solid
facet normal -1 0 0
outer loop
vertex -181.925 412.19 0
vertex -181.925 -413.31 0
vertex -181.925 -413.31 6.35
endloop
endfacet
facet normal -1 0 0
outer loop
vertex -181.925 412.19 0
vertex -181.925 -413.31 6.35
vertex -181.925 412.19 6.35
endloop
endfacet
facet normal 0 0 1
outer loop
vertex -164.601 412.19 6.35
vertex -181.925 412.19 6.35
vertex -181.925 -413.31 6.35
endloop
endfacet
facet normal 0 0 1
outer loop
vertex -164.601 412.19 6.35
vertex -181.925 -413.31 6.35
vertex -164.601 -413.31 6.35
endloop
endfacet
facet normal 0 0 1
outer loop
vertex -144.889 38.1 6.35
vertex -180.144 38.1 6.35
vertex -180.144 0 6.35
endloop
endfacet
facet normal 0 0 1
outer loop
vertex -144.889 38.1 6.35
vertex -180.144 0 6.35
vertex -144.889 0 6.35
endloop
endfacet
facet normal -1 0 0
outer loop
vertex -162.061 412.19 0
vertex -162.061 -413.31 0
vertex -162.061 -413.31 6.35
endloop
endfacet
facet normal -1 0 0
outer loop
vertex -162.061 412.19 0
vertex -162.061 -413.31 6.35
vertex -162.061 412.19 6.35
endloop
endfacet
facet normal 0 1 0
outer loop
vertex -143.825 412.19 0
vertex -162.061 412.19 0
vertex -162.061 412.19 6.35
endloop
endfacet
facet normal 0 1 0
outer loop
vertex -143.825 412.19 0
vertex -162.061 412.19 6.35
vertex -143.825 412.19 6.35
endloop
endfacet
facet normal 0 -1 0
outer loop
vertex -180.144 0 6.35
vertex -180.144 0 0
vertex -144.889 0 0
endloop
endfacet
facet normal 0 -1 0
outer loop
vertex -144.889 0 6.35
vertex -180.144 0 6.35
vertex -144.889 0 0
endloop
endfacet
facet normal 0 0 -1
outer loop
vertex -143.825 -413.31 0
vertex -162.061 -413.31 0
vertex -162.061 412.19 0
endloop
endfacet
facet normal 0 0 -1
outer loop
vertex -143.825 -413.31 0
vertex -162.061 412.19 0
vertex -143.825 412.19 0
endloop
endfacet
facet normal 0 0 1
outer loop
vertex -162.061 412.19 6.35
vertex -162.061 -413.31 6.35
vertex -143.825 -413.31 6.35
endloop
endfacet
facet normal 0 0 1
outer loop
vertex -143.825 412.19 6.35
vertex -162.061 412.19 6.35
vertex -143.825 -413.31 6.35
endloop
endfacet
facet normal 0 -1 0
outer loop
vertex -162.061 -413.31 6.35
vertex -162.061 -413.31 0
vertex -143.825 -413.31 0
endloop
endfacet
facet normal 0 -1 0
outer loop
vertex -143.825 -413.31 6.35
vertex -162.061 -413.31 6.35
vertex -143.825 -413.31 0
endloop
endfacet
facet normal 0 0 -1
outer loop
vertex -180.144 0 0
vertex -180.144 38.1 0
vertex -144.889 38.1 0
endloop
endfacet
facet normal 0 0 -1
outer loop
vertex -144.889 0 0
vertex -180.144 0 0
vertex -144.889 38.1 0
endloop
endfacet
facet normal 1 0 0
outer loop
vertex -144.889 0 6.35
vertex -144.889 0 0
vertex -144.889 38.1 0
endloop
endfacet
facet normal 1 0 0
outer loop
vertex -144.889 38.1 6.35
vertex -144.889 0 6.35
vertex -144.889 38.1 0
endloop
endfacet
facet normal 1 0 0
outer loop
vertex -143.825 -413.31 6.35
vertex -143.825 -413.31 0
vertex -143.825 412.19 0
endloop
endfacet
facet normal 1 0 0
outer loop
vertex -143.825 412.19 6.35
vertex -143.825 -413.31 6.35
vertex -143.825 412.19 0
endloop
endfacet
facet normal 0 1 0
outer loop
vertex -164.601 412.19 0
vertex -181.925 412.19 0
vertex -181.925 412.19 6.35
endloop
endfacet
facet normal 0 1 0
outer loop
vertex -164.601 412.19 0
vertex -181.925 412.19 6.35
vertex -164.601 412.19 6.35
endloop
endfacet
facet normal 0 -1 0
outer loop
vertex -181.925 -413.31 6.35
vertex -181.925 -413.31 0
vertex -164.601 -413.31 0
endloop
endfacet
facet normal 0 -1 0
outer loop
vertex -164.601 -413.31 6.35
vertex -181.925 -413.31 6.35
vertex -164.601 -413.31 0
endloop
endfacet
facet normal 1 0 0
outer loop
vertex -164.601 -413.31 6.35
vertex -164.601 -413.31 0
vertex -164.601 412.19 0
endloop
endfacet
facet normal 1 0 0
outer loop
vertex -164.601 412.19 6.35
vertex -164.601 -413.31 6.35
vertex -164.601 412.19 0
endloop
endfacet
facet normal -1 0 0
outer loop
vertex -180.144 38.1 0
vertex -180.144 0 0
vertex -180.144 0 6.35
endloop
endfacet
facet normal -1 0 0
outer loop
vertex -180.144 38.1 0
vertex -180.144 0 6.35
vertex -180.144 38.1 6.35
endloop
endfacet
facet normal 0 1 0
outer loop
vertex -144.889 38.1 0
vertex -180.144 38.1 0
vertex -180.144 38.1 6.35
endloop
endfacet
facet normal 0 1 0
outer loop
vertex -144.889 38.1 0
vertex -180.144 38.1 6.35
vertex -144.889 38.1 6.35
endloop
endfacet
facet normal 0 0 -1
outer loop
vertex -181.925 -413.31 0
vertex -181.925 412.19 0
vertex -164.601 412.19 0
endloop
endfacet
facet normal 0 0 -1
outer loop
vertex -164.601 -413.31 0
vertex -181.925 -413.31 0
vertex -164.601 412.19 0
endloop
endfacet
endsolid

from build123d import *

# Parameters (mm, degrees)
F0_W     = 38.1
F0_H     = 825.5
F2_DEPTH = 6.35
F1_W     = 2.54
F1_H     = 990.6
F3_DEPTH = 284.48
F4_W     = 35.2549552917
F4_H     = 38.1
F5_DEPTH = 6.35


# Not quite as in the source:
# - a feature of the source that left no trace in its solid (it failed there, or was rolled back) is left out


with BuildPart() as f2:
    # F0 (on Top) → F2 (new body)
    with BuildSketch(Plane.XY):
        with Locations((-162.8751962613, -0.5595125258)):
            Rectangle(F0_W, F0_H)
    extrude(amount=F2_DEPTH)

    # F1 (on face) → F3 (cut)
    with BuildSketch(Plane.XY):
        with Locations((-163.3307448435, -60.3681156158)):
            Rectangle(F1_W, F1_H)
    extrude(amount=F3_DEPTH, mode=Mode.SUBTRACT)


with BuildPart() as f5:
    # F4 (on face) → F5 (new body)
    with BuildSketch(Plane.XY):
        with Locations((-162.5160872936, 19.05)):
            Rectangle(F4_W, F4_H)
    extrude(amount=F5_DEPTH)


solid = Compound([f2.part, f5.part])
